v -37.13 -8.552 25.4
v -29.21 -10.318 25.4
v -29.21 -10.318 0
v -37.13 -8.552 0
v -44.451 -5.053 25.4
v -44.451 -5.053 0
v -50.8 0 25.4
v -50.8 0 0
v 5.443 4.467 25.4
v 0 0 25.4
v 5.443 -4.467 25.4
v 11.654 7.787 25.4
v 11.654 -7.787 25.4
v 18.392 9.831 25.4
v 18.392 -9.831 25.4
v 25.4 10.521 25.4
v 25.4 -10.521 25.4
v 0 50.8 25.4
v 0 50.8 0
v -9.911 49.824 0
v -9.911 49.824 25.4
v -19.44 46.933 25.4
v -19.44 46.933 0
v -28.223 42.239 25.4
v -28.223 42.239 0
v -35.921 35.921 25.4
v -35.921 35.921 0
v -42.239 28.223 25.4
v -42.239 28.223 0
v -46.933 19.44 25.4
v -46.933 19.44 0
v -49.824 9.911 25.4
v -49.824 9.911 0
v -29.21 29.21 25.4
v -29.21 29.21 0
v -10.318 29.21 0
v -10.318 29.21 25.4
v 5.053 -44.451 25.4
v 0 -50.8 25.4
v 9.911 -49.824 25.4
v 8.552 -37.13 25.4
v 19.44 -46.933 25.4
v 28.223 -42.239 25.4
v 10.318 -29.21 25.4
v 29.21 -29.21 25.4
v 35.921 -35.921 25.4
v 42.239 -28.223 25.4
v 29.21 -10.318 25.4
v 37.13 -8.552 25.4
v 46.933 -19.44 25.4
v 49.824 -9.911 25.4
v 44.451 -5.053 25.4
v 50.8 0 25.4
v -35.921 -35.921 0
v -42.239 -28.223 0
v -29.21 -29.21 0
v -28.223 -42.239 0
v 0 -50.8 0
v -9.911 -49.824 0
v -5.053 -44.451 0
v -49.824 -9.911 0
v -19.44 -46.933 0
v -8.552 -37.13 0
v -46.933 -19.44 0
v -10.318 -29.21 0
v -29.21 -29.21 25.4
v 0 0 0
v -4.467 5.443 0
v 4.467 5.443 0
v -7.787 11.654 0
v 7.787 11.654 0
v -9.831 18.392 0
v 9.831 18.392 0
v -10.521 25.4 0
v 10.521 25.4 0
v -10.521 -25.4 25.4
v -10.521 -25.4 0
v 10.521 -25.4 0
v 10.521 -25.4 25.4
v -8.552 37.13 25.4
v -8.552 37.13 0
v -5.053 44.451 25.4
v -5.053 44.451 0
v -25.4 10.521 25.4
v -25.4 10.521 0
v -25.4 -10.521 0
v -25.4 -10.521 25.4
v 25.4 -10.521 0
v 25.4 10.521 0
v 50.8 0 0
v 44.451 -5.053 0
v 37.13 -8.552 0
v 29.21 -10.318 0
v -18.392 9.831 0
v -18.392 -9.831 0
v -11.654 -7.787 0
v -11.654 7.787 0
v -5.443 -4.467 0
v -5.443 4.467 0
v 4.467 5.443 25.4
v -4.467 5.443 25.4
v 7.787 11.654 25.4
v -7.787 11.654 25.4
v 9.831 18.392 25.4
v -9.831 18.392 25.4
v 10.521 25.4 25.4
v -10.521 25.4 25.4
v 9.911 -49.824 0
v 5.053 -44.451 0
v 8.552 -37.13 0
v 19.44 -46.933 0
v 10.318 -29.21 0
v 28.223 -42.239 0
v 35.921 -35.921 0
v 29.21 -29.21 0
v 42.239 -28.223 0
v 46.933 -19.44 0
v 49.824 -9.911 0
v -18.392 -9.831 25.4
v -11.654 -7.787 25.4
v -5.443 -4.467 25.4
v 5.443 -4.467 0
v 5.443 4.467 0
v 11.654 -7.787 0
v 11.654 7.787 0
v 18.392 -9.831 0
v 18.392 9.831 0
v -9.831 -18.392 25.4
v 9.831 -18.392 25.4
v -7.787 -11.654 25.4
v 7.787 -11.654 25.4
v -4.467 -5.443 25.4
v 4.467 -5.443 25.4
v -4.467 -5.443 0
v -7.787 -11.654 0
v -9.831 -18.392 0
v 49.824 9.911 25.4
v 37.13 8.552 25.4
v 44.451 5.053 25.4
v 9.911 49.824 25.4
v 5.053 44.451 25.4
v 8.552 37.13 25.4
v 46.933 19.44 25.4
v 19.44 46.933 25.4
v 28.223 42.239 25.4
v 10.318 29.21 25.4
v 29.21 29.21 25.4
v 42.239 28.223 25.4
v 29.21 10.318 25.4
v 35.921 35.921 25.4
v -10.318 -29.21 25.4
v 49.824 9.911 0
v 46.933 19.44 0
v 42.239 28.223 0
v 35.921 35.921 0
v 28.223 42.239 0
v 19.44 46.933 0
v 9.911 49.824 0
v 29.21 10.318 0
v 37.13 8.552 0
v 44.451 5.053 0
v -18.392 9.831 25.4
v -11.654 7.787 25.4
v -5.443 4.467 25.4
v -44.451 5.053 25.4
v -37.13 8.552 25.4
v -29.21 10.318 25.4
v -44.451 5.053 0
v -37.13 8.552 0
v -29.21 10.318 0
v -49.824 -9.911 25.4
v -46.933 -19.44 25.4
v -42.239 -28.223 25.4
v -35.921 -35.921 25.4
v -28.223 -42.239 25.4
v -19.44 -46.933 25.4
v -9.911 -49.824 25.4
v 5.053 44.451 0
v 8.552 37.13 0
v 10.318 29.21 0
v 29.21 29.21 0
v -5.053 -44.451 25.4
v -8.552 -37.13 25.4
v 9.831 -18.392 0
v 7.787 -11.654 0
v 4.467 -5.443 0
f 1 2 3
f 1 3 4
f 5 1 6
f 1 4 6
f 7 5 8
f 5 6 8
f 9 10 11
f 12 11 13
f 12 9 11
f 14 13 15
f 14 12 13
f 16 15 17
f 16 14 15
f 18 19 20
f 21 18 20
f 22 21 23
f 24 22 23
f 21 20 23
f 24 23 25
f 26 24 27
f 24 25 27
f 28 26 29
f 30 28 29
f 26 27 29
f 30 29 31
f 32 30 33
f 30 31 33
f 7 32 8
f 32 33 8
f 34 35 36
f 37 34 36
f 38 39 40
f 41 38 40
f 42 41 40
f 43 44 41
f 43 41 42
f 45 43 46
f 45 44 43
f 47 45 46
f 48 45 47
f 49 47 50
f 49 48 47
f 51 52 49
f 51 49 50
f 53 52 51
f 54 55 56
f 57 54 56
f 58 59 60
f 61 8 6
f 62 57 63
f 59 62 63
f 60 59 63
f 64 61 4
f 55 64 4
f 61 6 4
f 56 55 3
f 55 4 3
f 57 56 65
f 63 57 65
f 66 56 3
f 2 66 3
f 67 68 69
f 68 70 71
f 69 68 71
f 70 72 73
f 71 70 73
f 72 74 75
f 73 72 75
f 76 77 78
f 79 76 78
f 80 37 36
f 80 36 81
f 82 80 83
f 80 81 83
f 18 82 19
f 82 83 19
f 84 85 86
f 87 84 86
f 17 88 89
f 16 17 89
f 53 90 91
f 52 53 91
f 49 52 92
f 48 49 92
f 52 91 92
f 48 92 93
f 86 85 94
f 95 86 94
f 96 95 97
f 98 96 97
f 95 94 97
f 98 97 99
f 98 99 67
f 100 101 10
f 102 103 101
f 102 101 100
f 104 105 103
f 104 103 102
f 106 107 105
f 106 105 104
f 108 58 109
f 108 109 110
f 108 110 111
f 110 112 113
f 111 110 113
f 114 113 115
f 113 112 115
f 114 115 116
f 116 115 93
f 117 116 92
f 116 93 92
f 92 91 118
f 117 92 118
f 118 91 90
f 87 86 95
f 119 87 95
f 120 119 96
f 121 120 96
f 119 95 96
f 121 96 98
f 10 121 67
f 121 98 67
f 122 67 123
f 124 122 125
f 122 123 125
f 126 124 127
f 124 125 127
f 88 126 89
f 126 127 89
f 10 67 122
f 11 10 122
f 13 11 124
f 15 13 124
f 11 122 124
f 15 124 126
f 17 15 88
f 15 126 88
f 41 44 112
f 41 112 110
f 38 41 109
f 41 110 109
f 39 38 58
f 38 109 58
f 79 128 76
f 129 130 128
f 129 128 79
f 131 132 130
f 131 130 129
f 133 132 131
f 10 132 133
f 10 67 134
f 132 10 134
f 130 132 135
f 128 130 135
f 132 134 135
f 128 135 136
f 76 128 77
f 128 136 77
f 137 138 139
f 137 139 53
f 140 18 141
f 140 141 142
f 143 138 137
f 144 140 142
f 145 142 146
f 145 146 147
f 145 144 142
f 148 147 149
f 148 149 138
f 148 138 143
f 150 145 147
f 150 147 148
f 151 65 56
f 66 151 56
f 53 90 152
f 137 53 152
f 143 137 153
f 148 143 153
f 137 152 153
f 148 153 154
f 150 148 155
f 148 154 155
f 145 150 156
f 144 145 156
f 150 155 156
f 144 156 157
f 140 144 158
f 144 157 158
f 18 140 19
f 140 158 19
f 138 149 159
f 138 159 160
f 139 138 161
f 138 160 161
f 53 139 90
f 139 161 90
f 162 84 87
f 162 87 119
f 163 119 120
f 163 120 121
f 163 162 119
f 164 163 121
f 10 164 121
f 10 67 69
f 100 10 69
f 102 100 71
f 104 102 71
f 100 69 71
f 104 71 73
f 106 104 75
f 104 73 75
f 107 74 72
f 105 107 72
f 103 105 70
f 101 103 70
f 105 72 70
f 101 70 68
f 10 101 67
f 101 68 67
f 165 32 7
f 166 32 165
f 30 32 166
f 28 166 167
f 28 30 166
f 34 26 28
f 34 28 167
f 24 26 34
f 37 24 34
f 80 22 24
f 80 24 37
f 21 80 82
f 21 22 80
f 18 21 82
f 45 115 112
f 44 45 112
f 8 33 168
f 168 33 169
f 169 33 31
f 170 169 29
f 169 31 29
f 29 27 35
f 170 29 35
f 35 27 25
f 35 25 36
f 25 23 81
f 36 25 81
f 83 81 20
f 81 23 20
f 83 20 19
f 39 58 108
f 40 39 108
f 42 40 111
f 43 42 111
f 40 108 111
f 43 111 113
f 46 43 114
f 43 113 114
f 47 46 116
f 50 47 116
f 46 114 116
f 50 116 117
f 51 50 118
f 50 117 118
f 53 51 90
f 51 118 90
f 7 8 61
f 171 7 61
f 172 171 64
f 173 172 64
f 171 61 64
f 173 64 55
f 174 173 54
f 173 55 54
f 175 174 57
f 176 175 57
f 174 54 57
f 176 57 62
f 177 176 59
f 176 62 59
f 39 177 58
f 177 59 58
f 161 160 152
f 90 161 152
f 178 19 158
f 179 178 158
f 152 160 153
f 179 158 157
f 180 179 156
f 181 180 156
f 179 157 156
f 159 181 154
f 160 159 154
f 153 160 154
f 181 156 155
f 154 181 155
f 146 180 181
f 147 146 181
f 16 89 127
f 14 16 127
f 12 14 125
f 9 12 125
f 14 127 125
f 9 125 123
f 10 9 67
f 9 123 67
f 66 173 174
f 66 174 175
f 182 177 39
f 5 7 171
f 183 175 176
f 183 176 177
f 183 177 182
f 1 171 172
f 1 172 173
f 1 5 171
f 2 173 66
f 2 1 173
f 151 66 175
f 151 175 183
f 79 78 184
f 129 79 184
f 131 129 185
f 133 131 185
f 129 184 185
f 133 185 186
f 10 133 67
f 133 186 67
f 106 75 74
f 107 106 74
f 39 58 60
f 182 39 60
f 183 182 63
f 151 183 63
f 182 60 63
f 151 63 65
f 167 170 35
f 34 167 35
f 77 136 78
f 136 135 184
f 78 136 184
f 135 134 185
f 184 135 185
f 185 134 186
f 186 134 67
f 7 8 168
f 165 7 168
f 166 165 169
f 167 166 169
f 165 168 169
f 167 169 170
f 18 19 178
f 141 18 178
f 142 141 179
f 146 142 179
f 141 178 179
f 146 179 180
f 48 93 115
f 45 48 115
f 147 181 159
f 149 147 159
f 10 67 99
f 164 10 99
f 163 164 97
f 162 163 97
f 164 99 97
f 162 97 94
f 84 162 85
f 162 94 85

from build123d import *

# Parameters (mm, degrees)
F1_DEPTH = 25.4


with BuildPart() as f1:
    # F0 (on Top) → F1 (new body)
    with BuildSketch(Plane.XY):
        with BuildLine():
            ThreePointArc((-10.3183972205, 29.21), (-7.0098232747, 40.8894594902), (0, 50.8))
            ThreePointArc((0, 50.8), (-35.9210244843, 35.9210244843), (-50.8, 0))
            ThreePointArc((-50.8, 0), (-40.8894594902, 7.0098232747), (-29.21, 10.3183972205))
            Line((-29.21, 10.3183972205), (-29.21, 29.21))
            Line((-29.21, 29.21), (-10.3183972205, 29.21))
        make_face()
    extrude(amount=F1_DEPTH)


with BuildPart() as f1b:
    # F0 (on Top) → F1, piece 2 (new body)
    with BuildSketch(Plane.XY):
        with BuildLine():
            ThreePointArc((50.8, 0), (35.9210244843, 35.9210244843), (0, 50.8))
            ThreePointArc((0, 50.8), (7.0098232747, 40.8894594902), (10.3183972205, 29.21))
            Line((10.3183972205, 29.21), (29.21, 29.21))
            Line((29.21, 29.21), (29.21, 10.3183972205))
            ThreePointArc((29.21, 10.3183972205), (40.8894594902, 7.0098232747), (50.8, 0))
        make_face()
    extrude(amount=F1_DEPTH)


with BuildPart() as f1c:
    # F0 (on Top) → F1, piece 3 (new body)
    with BuildSketch(Plane.XY):
        with BuildLine():
            ThreePointArc((0, -50.8), (35.9210244843, -35.9210244843), (50.8, 0))
            ThreePointArc((50.8, 0), (40.8894594902, -7.0098232747), (29.21, -10.3183972205))
            Line((29.21, -10.3183972205), (29.21, -29.21))
            Line((29.21, -29.21), (10.3183972205, -29.21))
            ThreePointArc((10.3183972205, -29.21), (7.0098232747, -40.8894594902), (0, -50.8))
        make_face()
    extrude(amount=F1_DEPTH)


with BuildPart() as f1d:
    # F0 (on Top) → F1, piece 4 (new body)
    with BuildSketch(Plane.XY):
        with BuildLine():
            ThreePointArc((-29.21, -10.3183972205), (-40.8894594902, -7.0098232747), (-50.8, 0))
            ThreePointArc((-50.8, 0), (-35.9210244843, -35.9210244843), (0, -50.8))
            ThreePointArc((0, -50.8), (-7.0098232747, -40.8894594902), (-10.3183972205, -29.21))
            Line((-10.3183972205, -29.21), (-29.21, -29.21))
            Line((-29.21, -29.21), (-29.21, -10.3183972205))
        make_face()
    extrude(amount=F1_DEPTH)


with BuildPart() as f1e:
    # F0 (on Top) → F1, piece 5 (new body)
    with BuildSketch(Plane.XY):
        with BuildLine():
            Line((-25.4, 10.5210244843), (-25.4, -10.5210244843))
            ThreePointArc((-25.4, -10.5210244843), (-11.6536190708, -7.7866993139), (-2.22e-08, -2.22e-08))
            ThreePointArc((-2.22e-08, 2.22e-08), (-11.6536190708, 7.7866993139), (-25.4, 10.5210244843))
        make_face()
    extrude(amount=F1_DEPTH)


with BuildPart() as f1f:
    # F0 (on Top) → F1, piece 6 (new body)
    with BuildSketch(Plane.XY):
        with BuildLine():
            Line((10.5210244843, 25.4), (-10.5210244843, 25.4))
            ThreePointArc((-10.5210244843, 25.4), (-7.7866993139, 11.6536190708), (-2.22e-08, 2.22e-08))
            ThreePointArc((-2.22e-08, -2.22e-08), (7.7866993019, 11.6536190418), (10.5210244843, 25.4))
        make_face()
    extrude(amount=F1_DEPTH)


with BuildPart() as f1g:
    # F0 (on Top) → F1, piece 7 (new body)
    with BuildSketch(Plane.XY):
        with BuildLine():
            ThreePointArc((-2.22e-08, 2.22e-08), (11.6536190418, -7.7866993019), (25.4, -10.5210244843))
            Line((25.4, -10.5210244843), (25.4, 10.5210244843))
            ThreePointArc((25.4, 10.5210244843), (11.6536190418, 7.7866993019), (-2.22e-08, -2.22e-08))
        make_face()
    extrude(amount=F1_DEPTH)


with BuildPart() as f1h:
    # F0 (on Top) → F1, piece 8 (new body)
    with BuildSketch(Plane.XY):
        with BuildLine():
            ThreePointArc((10.5210244843, -25.4), (7.7866993019, -11.6536190418), (-2.22e-08, 2.22e-08))
            ThreePointArc((-2.22e-08, -2.22e-08), (-7.7866993139, -11.6536190708), (-10.5210244843, -25.4))
            Line((-10.5210244843, -25.4), (10.5210244843, -25.4))
        make_face()
    extrude(amount=F1_DEPTH)


solid = Compound([f1.part, f1b.part, f1c.part, f1d.part, f1e.part, f1f.part, f1g.part, f1h.part])
